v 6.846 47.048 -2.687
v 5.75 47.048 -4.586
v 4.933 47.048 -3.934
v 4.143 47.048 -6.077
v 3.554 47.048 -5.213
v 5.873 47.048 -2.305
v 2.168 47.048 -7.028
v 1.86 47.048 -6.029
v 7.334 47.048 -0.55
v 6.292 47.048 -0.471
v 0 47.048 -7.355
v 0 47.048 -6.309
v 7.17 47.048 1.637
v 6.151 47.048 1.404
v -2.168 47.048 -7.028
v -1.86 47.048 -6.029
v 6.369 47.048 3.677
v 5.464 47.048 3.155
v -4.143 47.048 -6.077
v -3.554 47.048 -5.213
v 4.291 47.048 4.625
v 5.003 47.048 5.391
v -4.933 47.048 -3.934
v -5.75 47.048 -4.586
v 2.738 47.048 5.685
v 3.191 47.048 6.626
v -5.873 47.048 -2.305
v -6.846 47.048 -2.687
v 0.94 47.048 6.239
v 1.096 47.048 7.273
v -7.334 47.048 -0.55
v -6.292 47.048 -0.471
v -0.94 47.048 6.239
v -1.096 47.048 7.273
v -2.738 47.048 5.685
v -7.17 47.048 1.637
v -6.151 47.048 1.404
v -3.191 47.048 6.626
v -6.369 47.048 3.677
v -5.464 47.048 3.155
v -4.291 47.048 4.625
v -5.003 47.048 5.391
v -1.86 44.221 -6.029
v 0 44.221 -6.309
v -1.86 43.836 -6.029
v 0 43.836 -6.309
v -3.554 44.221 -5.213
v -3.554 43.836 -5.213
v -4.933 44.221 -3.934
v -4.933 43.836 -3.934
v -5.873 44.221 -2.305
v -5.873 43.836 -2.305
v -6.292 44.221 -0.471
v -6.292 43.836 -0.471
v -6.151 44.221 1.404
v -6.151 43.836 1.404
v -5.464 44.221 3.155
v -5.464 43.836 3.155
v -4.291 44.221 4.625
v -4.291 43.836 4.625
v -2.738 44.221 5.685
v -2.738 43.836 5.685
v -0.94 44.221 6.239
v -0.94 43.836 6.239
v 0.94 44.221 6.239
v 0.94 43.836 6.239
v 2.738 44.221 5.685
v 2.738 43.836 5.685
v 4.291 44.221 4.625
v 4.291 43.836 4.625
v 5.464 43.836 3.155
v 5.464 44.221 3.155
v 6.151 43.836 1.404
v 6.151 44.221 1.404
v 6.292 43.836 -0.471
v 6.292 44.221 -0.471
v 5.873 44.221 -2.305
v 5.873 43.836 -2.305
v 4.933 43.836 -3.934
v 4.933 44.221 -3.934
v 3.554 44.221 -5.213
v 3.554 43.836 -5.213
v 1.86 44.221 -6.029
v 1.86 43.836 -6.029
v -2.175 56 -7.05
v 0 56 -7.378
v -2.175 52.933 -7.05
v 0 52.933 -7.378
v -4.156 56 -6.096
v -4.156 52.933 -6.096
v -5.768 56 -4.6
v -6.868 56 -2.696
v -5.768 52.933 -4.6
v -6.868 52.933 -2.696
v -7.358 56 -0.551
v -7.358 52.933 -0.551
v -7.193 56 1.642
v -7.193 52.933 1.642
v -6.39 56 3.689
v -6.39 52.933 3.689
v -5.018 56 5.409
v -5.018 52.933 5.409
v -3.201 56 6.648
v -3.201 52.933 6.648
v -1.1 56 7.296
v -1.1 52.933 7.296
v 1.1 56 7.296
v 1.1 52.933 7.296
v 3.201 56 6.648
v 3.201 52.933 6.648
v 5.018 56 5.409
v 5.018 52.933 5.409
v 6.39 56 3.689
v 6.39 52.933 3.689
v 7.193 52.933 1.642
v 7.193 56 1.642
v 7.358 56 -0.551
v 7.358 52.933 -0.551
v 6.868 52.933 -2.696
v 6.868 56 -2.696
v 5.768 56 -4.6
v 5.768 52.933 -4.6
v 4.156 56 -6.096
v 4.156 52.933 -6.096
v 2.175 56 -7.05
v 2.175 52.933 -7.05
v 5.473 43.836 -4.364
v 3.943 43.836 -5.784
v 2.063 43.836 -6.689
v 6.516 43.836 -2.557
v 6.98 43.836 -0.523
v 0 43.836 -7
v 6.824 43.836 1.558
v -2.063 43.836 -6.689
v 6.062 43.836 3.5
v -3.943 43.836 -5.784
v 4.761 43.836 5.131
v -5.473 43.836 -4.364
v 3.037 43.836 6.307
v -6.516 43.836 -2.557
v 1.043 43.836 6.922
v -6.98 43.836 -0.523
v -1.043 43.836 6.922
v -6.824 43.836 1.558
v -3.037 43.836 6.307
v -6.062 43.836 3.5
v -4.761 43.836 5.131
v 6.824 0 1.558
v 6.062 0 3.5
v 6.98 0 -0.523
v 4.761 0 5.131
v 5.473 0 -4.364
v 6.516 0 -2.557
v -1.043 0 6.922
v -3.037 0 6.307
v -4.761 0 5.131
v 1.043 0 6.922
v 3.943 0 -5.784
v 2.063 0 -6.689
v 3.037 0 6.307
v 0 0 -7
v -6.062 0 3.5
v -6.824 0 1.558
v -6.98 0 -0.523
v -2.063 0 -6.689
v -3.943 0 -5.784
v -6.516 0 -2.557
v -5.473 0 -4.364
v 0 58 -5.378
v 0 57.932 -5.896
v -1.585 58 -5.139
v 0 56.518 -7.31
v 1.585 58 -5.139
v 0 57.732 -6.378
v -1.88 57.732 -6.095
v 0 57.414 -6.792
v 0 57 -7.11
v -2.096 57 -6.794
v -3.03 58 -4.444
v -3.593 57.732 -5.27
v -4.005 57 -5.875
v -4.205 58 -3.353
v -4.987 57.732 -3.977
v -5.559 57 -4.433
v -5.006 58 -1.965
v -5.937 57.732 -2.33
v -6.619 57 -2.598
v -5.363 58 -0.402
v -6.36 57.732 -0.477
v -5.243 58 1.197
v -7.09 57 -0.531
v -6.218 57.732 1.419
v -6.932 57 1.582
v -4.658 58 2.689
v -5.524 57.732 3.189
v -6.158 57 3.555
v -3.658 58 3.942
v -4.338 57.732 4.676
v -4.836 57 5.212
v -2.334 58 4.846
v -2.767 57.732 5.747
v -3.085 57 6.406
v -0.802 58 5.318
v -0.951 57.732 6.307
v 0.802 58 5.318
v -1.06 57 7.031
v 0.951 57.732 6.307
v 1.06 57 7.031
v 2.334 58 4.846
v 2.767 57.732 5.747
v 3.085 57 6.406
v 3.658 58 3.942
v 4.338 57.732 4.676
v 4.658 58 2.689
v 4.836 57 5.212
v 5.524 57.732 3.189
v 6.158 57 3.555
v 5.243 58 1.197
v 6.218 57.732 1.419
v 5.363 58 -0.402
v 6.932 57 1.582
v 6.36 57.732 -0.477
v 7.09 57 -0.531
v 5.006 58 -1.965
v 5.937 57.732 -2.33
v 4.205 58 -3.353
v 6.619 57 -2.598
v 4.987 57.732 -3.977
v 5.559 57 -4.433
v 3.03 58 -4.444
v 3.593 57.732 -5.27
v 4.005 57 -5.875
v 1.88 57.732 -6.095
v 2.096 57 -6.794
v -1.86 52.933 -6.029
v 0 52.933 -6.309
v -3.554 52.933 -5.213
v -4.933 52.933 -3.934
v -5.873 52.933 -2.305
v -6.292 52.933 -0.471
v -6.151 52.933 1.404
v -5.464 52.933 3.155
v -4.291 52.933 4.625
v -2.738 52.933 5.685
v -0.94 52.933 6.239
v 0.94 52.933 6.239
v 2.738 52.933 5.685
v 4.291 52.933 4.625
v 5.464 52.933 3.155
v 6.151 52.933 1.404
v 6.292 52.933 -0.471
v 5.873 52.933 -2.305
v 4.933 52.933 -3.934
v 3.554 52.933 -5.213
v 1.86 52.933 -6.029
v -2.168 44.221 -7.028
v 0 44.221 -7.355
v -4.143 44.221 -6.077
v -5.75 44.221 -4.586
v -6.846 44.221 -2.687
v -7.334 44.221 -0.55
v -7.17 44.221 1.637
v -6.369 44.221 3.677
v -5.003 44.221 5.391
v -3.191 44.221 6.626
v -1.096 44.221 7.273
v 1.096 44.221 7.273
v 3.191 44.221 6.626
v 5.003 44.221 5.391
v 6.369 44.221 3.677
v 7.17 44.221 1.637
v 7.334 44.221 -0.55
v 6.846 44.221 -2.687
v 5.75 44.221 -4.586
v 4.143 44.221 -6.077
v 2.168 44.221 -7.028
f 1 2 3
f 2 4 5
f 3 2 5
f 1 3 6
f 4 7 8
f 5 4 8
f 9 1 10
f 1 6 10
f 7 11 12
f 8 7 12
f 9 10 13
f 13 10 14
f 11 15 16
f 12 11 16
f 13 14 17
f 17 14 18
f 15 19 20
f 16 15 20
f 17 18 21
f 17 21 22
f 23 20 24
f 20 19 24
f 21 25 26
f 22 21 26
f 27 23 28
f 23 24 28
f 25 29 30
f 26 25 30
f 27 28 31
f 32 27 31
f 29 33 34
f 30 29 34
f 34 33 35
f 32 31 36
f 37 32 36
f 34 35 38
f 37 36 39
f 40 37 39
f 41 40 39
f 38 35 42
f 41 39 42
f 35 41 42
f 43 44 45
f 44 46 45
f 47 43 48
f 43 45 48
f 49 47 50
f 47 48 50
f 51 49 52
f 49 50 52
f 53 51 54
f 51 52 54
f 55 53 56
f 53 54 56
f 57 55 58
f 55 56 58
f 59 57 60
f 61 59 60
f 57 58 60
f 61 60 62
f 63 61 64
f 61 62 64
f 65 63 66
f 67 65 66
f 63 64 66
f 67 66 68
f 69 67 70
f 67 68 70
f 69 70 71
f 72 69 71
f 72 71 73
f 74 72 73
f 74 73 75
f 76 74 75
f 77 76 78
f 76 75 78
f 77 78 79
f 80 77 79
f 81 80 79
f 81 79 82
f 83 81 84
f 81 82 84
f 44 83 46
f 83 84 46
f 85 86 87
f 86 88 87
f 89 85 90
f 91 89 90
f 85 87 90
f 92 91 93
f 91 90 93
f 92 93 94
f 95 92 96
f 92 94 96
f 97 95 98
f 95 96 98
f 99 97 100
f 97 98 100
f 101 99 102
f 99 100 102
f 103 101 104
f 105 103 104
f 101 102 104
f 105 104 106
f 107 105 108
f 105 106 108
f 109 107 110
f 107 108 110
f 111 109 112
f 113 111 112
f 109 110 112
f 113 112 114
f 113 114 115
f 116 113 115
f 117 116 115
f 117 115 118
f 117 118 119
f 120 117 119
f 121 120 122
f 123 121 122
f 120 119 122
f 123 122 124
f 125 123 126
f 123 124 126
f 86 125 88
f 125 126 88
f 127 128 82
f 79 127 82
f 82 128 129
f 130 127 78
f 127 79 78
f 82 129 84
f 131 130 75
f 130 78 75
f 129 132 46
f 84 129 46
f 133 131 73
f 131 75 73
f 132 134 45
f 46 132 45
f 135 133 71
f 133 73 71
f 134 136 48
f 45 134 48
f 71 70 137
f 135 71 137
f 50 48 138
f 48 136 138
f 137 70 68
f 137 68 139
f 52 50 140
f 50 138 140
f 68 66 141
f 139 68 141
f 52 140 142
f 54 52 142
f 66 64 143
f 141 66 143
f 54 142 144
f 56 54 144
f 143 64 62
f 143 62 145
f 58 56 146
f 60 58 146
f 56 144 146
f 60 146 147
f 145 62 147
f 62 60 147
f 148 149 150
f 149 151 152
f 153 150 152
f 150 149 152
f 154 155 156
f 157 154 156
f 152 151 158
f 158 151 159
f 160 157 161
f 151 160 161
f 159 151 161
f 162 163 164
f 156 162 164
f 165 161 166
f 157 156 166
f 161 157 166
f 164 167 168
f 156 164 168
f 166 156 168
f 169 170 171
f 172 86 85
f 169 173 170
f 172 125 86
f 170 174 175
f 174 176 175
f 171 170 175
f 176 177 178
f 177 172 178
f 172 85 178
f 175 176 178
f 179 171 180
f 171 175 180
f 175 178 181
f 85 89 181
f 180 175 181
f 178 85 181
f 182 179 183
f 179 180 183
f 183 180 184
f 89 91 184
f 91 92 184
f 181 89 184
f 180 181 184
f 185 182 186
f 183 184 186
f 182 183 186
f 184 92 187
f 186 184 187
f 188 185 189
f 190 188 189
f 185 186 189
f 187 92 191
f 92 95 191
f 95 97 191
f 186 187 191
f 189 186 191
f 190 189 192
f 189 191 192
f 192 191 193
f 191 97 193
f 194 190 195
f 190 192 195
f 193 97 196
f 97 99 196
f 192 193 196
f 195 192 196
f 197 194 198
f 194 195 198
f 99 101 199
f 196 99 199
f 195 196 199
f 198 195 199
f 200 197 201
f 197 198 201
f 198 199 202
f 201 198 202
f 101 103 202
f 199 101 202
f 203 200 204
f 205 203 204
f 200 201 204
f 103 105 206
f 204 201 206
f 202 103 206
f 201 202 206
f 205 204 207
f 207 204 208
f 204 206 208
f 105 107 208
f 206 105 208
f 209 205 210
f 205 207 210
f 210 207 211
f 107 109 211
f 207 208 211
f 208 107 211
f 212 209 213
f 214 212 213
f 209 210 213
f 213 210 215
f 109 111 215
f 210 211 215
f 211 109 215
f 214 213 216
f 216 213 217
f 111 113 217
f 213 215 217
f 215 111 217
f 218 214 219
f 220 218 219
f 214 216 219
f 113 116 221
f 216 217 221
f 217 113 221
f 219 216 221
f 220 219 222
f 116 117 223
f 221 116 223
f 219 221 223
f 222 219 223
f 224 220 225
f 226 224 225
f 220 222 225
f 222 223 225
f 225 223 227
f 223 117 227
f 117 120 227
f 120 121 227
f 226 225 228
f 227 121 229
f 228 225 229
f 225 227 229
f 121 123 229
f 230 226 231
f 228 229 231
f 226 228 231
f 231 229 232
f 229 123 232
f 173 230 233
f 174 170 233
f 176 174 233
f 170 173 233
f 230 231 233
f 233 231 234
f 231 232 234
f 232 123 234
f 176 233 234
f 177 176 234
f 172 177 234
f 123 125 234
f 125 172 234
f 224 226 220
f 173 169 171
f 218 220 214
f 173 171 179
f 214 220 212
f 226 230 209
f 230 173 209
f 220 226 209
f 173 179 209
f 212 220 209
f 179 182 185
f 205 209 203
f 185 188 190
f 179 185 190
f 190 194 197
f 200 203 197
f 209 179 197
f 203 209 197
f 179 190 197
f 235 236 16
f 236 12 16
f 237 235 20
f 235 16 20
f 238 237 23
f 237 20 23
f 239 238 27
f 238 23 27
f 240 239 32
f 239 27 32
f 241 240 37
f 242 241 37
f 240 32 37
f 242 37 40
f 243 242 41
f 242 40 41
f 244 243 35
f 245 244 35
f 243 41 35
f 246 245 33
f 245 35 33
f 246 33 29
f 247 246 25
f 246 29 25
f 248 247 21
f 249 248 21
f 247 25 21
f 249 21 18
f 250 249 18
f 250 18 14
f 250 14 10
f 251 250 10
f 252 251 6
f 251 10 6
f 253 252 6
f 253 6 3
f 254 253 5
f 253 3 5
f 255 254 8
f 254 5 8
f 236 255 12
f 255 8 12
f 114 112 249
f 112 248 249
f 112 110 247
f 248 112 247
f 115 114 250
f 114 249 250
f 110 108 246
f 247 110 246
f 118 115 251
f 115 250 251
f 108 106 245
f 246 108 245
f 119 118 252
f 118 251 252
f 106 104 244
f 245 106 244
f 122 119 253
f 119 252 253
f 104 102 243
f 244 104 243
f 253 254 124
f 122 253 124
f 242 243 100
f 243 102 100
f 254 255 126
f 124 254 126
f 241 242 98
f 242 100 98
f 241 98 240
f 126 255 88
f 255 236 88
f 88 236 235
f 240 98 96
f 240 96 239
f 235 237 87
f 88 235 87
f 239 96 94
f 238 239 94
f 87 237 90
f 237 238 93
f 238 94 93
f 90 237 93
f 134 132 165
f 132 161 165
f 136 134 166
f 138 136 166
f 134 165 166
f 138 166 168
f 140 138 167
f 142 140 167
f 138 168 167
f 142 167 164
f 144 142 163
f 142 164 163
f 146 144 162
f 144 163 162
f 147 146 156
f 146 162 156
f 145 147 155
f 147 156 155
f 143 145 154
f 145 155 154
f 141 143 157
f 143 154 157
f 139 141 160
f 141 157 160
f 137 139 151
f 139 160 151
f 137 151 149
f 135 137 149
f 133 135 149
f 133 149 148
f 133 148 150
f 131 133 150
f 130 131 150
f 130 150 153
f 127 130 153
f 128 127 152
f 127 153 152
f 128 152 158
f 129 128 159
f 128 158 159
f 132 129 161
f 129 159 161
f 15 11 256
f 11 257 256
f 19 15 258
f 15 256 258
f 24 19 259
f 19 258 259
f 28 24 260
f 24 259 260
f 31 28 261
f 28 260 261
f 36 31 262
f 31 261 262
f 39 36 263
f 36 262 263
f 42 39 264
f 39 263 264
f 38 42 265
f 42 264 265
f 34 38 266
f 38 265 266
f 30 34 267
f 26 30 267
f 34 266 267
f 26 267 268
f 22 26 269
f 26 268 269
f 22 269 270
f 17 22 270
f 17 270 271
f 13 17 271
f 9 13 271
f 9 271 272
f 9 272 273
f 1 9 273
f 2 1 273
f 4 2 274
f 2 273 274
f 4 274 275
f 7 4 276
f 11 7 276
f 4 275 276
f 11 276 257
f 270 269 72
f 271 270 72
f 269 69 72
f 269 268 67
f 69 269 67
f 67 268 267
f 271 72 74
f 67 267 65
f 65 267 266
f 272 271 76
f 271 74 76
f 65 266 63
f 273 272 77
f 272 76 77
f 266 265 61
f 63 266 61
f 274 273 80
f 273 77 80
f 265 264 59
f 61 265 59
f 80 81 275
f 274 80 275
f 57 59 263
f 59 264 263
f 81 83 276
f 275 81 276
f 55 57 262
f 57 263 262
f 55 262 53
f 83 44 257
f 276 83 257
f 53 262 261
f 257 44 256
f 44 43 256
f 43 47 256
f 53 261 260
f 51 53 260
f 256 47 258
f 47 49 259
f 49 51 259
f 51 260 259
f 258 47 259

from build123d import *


with BuildPart() as part:
    # 草图1 → 旋转4 (revolve)
    with BuildSketch(Plane(origin=(0, 0, 0), x_dir=(0, 0, -1), z_dir=(1, 0, 0)), mode=Mode.PRIVATE) as revolve_4_sk:
        with BuildLine():
            Line((-7, 0), (0, 0))
            Line((0, 0), (0, 58))
            Line((0, 58), (-5.378171024, 58))
            ThreePointArc((-5.378171024, 58), (-6.792384586, 57.414213562), (-7.378171024, 56))
            Line((-7.378171024, 56), (-7.378171024, 52.933330123))
            Line((-7.378171024, 52.933330123), (-6.309364611, 52.933330123))
            Line((-6.309364611, 52.933330123), (-6.309364611, 47.048318533))
            Line((-6.309364611, 47.048318533), (-7.354829453, 47.048318533))
            Line((-7.354829453, 47.048318533), (-7.354829453, 44.220608725))
            Line((-7.354829453, 44.220608725), (-6.309364611, 44.220608725))
            Line((-6.309364611, 44.220608725), (-6.309364611, 43.835644878))
            Line((-6.309364611, 43.835644878), (-7, 43.835644878))
            Line((-7, 43.835644878), (-7, 0))
        make_face()
    revolve(revolve_4_sk.sketch.rotate(Axis((0, 0, 0), (0, 1, 0)), 180), axis=Axis((0, 0, 0), (0, 1, 0)))


solid = part.part
